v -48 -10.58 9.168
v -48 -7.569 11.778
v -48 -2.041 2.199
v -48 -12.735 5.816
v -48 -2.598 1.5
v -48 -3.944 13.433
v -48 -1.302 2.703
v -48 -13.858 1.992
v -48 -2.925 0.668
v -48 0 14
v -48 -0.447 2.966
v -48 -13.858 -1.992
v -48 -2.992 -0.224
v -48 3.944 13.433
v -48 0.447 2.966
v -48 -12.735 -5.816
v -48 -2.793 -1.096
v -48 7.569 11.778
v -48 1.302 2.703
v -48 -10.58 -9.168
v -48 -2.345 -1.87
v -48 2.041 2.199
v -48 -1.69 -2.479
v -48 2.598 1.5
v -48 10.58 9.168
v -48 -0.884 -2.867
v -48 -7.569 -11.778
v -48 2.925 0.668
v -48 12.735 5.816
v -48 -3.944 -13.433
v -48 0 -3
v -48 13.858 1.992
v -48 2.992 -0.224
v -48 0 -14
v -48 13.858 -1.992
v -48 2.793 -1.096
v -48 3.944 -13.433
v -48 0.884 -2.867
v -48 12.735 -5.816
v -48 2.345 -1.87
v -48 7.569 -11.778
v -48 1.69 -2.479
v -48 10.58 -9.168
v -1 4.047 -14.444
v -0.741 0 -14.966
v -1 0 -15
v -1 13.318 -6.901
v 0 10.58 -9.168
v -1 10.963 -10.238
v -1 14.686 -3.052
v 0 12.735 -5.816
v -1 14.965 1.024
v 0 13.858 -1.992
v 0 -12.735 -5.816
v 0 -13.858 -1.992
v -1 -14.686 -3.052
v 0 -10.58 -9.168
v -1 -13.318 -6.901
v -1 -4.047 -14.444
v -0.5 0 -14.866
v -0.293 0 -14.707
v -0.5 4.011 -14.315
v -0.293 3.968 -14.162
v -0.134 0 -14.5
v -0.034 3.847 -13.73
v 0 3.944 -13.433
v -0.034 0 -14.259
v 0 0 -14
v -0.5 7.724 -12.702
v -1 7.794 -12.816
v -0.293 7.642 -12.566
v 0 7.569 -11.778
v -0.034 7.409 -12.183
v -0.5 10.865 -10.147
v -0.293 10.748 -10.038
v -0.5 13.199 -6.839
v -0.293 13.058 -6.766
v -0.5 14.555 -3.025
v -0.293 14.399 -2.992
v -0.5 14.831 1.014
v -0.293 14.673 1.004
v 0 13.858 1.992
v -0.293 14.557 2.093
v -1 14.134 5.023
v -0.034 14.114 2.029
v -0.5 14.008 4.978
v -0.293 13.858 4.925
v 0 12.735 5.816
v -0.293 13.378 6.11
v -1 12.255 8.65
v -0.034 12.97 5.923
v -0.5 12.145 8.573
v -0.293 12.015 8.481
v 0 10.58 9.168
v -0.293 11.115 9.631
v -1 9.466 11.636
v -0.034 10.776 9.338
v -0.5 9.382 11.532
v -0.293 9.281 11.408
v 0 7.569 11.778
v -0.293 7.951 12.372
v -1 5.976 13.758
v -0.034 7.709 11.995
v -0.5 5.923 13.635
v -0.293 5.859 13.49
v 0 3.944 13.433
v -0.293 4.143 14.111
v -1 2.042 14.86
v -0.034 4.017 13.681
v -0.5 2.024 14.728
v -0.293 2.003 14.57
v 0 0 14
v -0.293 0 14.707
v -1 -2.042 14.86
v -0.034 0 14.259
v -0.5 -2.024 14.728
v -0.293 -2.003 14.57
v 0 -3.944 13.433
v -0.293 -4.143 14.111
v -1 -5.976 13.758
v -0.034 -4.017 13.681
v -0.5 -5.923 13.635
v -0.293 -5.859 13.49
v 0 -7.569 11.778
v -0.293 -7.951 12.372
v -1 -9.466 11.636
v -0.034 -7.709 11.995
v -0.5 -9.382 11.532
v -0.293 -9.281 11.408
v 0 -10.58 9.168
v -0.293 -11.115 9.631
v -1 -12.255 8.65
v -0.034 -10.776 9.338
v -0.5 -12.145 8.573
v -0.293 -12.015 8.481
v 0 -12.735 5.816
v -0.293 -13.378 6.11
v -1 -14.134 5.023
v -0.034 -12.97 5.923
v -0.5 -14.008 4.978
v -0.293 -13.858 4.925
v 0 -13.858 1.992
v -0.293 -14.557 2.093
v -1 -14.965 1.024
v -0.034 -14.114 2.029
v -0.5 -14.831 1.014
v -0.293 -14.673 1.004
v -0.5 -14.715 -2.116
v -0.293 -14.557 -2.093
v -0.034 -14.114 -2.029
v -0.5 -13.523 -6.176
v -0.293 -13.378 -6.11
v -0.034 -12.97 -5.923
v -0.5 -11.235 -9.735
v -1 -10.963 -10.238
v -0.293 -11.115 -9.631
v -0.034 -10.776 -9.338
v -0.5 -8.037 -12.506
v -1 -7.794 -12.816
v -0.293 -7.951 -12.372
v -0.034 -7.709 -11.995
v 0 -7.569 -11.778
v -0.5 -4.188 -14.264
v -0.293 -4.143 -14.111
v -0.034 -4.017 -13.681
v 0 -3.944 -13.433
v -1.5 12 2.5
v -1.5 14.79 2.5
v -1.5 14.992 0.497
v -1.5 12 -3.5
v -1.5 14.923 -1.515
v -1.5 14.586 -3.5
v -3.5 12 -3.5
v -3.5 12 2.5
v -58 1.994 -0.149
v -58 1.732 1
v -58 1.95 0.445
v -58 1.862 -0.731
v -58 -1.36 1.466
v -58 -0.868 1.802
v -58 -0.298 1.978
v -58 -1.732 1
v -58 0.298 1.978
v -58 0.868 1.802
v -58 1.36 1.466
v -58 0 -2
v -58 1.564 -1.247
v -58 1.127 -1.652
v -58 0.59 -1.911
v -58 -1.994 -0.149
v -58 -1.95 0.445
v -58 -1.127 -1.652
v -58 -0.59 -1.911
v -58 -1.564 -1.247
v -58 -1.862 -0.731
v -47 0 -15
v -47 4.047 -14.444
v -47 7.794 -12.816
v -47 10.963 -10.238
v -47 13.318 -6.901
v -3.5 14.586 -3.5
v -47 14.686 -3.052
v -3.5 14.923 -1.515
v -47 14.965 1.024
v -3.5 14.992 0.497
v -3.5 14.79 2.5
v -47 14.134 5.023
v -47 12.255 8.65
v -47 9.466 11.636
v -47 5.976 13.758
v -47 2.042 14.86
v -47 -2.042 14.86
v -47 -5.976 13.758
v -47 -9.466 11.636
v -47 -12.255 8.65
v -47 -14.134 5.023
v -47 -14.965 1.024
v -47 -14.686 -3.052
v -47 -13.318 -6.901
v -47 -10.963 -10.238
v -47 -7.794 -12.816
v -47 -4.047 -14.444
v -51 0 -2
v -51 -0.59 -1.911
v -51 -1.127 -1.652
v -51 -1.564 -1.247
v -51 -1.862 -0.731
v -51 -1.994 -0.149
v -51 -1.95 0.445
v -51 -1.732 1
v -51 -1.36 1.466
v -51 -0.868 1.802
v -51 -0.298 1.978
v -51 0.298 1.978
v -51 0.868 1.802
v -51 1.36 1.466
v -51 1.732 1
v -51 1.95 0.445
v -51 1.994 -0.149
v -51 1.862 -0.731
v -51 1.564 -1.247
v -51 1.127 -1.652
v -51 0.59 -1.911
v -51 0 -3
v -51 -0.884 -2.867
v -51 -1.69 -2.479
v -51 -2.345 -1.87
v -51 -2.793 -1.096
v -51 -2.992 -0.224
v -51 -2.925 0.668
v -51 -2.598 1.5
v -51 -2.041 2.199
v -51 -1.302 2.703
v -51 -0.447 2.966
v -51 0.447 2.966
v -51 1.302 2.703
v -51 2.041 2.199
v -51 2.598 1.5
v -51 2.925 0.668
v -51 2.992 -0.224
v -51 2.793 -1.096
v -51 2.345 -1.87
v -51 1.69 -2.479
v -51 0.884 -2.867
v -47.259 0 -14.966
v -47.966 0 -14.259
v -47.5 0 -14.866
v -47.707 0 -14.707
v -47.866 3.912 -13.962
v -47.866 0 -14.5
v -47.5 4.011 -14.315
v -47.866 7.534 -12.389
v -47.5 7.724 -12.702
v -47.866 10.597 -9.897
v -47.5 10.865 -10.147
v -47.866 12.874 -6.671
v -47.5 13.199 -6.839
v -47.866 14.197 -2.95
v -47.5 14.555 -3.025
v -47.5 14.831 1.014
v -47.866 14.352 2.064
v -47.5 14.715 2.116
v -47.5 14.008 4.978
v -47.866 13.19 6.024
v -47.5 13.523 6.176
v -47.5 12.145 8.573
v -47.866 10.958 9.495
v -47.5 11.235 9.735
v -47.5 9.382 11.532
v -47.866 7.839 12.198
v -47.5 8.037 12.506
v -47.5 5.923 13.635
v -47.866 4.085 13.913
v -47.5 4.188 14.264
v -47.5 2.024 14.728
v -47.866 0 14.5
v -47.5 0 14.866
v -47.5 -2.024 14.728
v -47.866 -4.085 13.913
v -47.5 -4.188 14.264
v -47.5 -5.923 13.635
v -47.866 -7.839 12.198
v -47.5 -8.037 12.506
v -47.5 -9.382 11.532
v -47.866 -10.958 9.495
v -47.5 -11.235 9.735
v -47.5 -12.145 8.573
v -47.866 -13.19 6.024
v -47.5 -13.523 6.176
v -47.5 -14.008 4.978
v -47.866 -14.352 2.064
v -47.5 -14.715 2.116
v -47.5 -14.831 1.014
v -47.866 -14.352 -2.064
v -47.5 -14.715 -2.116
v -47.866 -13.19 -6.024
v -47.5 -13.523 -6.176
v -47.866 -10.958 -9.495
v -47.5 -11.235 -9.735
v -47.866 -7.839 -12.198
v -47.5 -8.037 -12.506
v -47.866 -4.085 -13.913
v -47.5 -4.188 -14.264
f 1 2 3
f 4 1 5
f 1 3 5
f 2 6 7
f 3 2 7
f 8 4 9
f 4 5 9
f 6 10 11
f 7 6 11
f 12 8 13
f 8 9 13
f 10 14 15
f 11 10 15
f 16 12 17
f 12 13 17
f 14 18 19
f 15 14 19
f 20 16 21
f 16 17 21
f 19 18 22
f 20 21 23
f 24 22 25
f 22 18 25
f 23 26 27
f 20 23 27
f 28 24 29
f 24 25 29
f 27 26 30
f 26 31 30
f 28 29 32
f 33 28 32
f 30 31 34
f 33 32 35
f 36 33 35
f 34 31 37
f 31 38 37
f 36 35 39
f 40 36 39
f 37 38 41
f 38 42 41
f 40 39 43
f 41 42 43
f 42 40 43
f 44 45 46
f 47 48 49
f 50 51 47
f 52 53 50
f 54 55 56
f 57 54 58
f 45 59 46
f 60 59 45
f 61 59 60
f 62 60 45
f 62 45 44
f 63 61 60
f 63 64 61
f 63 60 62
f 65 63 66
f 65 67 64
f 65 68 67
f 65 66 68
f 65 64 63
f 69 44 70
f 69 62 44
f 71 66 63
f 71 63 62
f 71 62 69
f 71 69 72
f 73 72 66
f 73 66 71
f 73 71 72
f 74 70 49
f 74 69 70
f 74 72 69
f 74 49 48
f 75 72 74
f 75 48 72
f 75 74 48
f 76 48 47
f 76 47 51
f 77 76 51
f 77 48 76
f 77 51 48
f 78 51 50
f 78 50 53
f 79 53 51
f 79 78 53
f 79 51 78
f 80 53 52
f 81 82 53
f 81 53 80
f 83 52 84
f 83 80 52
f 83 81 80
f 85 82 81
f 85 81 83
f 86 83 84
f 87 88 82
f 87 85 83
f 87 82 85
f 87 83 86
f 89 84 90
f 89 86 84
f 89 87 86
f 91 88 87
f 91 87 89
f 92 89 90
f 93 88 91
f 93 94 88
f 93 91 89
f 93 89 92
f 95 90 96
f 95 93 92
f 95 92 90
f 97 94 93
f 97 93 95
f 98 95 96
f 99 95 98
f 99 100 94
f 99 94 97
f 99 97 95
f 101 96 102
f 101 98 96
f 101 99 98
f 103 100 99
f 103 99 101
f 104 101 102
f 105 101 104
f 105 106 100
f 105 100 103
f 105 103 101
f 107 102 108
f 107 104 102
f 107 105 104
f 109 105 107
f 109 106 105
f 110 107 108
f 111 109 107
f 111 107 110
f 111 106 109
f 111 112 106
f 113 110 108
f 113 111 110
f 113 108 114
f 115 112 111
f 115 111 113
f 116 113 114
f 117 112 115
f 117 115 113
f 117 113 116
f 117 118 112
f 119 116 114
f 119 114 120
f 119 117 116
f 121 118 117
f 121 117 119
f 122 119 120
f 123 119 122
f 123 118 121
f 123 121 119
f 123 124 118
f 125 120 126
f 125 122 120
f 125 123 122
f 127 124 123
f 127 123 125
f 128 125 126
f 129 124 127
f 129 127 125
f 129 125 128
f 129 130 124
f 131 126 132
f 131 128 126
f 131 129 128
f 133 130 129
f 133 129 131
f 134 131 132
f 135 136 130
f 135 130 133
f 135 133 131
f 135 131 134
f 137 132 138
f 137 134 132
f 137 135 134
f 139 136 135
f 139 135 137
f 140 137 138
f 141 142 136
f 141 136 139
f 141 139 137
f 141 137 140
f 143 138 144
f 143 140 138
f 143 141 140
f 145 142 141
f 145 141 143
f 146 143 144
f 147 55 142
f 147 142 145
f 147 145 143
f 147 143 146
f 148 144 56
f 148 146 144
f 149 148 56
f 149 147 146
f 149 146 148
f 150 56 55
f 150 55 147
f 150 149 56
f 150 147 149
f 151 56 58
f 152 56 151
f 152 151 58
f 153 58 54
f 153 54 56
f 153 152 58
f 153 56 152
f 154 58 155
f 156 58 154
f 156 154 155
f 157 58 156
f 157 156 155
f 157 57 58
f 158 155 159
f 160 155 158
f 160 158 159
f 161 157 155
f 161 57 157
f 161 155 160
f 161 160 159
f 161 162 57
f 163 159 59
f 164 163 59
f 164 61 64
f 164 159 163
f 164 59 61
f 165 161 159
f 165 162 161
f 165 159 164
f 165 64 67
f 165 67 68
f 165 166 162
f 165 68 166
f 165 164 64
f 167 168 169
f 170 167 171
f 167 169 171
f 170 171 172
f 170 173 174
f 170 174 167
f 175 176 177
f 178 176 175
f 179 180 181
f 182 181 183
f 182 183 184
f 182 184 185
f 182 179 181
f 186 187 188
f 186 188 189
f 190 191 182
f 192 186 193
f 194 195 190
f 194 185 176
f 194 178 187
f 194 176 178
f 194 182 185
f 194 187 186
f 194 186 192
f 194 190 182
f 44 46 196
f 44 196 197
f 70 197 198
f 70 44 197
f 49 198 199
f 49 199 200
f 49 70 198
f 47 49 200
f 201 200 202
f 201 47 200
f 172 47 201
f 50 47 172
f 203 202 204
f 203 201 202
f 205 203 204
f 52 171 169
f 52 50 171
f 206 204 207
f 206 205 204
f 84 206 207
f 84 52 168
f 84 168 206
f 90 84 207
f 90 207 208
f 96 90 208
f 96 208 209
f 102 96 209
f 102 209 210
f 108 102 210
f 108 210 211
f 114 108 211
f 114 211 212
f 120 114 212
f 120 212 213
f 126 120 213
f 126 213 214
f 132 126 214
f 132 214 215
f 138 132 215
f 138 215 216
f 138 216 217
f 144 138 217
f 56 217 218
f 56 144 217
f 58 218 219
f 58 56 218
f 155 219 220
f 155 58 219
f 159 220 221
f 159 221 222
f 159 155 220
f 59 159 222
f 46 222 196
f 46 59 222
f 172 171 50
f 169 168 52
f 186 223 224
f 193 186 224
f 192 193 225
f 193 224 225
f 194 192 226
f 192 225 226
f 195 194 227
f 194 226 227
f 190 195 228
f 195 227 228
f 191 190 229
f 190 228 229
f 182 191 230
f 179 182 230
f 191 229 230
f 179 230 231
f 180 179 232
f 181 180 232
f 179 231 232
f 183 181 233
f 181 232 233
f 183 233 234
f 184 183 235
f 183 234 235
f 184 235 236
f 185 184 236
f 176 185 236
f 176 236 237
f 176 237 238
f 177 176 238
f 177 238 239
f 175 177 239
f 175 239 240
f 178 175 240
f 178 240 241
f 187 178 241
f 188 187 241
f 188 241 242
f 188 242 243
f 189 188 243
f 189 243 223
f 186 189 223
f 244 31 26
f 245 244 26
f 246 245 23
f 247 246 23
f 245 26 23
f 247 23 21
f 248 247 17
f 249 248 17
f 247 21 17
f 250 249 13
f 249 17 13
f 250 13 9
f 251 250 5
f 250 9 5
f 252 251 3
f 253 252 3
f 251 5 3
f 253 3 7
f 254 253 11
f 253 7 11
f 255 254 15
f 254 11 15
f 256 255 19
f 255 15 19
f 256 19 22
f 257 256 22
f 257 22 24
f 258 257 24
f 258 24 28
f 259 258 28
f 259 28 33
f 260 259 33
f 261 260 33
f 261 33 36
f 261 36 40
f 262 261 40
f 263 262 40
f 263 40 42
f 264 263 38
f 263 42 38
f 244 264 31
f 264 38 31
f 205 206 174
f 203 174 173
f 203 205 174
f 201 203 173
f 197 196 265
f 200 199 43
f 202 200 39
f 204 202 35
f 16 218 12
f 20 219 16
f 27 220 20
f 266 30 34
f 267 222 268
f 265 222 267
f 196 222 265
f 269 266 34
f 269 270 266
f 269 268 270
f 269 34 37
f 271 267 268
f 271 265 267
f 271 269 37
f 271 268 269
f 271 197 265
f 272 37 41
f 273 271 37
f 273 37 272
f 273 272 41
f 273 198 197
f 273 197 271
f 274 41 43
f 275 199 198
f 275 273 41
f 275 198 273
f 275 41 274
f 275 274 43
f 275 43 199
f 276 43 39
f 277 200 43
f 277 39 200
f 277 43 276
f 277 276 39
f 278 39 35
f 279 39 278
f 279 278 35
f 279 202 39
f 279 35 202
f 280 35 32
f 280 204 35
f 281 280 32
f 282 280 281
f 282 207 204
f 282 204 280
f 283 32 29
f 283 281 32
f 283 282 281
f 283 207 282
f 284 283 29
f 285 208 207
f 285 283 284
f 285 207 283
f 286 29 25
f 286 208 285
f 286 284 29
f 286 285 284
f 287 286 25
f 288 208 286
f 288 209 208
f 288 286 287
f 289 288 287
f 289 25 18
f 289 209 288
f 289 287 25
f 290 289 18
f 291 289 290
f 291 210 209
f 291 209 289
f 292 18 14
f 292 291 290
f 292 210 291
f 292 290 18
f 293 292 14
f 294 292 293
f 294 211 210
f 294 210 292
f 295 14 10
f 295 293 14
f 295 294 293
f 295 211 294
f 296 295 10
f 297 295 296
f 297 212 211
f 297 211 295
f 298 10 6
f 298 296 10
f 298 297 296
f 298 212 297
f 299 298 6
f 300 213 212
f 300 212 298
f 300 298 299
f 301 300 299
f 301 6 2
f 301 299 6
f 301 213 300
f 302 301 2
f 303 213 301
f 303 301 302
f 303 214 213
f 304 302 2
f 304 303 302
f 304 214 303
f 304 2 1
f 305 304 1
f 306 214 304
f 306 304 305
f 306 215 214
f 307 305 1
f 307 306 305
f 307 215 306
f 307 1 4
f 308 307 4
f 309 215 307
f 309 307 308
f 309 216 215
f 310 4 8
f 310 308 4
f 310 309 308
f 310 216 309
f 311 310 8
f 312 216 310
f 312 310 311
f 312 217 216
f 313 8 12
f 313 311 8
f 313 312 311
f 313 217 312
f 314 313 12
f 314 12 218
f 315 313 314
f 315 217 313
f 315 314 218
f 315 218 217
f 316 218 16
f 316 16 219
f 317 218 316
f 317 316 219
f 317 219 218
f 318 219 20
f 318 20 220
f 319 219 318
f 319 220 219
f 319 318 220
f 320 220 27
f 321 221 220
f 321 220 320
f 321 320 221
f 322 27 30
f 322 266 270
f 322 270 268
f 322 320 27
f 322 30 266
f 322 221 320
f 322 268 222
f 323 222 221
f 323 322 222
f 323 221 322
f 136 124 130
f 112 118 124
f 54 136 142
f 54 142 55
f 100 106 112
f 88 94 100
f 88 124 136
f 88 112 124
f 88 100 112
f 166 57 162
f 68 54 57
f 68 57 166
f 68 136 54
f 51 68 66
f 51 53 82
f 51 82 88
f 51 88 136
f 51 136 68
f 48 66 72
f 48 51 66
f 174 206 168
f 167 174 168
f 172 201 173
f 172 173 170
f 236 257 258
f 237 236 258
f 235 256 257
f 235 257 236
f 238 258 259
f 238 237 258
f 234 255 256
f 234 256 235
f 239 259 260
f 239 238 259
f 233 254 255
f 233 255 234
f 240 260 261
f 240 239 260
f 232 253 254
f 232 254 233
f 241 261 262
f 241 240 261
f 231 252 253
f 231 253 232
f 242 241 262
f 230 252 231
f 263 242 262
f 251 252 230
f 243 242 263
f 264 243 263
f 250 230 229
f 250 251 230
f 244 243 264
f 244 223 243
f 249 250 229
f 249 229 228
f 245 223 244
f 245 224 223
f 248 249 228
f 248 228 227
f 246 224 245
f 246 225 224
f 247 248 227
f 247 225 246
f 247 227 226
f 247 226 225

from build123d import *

# Parameters (mm, degrees)
SKETCH_1_R          = 15
EXTRUDE_1_DEPTH     = 48
SKETCH_2_R          = 2
EXTRUDE_2_DEPTH     = 10
SKETCH_3_R          = 3
EXTRUDE_3_DEPTH     = 3
FILLET_1_R          = 1
FILLET_2_R          = 1
CUT_EXTRUDE_START   = 15
SKETCH_4_W          = 2
SKETCH_4_H          = 6
CUT_EXTRUDE_1_DEPTH = 3


with BuildPart() as part:
    # 草图1 → 凸台-拉伸1 (new body)
    with BuildSketch(Plane(origin=(0, 0, 0), x_dir=(0, 0, -1), z_dir=(1, 0, 0))):
        Circle(SKETCH_1_R)
    extrude(amount=-EXTRUDE_1_DEPTH)

    # 草图2 → 凸台-拉伸2 (add)
    with BuildSketch(Plane.ZY.offset(48)):
        with Locations(Location((0, 0, 0), (0, 0, 180))):
            Circle(SKETCH_2_R)
    extrude(amount=EXTRUDE_2_DEPTH)

    # 草图3 → 凸台-拉伸3 (add)
    with BuildSketch(Plane.ZY.offset(48)):
        with Locations(Location((0, 0, 0), (0, 0, 180))):
            Circle(SKETCH_3_R)
    extrude(amount=EXTRUDE_3_DEPTH)

    # 圆角1
    fillet_1_edges = [part.edges().sort_by_distance(p)[0] for p in [
        (-48, 0, 15),
    ]]
    fillet(fillet_1_edges, radius=FILLET_1_R)

    # 圆角2
    fillet_2_edges = [part.edges().sort_by_distance(p)[0] for p in [
        (0, 0, 15),
    ]]
    fillet(fillet_2_edges, radius=FILLET_2_R)

    # 草图4 → 切除-拉伸1 (cut)
    with BuildSketch(Plane(origin=(0, 0, 0), x_dir=(1, 0, 0), z_dir=(0, 1, 0)).offset(CUT_EXTRUDE_START)):
        with Locations((-2.5, 0.5)):
            Rectangle(SKETCH_4_W, SKETCH_4_H)
    extrude(amount=-CUT_EXTRUDE_1_DEPTH, mode=Mode.SUBTRACT)


solid = part.part
